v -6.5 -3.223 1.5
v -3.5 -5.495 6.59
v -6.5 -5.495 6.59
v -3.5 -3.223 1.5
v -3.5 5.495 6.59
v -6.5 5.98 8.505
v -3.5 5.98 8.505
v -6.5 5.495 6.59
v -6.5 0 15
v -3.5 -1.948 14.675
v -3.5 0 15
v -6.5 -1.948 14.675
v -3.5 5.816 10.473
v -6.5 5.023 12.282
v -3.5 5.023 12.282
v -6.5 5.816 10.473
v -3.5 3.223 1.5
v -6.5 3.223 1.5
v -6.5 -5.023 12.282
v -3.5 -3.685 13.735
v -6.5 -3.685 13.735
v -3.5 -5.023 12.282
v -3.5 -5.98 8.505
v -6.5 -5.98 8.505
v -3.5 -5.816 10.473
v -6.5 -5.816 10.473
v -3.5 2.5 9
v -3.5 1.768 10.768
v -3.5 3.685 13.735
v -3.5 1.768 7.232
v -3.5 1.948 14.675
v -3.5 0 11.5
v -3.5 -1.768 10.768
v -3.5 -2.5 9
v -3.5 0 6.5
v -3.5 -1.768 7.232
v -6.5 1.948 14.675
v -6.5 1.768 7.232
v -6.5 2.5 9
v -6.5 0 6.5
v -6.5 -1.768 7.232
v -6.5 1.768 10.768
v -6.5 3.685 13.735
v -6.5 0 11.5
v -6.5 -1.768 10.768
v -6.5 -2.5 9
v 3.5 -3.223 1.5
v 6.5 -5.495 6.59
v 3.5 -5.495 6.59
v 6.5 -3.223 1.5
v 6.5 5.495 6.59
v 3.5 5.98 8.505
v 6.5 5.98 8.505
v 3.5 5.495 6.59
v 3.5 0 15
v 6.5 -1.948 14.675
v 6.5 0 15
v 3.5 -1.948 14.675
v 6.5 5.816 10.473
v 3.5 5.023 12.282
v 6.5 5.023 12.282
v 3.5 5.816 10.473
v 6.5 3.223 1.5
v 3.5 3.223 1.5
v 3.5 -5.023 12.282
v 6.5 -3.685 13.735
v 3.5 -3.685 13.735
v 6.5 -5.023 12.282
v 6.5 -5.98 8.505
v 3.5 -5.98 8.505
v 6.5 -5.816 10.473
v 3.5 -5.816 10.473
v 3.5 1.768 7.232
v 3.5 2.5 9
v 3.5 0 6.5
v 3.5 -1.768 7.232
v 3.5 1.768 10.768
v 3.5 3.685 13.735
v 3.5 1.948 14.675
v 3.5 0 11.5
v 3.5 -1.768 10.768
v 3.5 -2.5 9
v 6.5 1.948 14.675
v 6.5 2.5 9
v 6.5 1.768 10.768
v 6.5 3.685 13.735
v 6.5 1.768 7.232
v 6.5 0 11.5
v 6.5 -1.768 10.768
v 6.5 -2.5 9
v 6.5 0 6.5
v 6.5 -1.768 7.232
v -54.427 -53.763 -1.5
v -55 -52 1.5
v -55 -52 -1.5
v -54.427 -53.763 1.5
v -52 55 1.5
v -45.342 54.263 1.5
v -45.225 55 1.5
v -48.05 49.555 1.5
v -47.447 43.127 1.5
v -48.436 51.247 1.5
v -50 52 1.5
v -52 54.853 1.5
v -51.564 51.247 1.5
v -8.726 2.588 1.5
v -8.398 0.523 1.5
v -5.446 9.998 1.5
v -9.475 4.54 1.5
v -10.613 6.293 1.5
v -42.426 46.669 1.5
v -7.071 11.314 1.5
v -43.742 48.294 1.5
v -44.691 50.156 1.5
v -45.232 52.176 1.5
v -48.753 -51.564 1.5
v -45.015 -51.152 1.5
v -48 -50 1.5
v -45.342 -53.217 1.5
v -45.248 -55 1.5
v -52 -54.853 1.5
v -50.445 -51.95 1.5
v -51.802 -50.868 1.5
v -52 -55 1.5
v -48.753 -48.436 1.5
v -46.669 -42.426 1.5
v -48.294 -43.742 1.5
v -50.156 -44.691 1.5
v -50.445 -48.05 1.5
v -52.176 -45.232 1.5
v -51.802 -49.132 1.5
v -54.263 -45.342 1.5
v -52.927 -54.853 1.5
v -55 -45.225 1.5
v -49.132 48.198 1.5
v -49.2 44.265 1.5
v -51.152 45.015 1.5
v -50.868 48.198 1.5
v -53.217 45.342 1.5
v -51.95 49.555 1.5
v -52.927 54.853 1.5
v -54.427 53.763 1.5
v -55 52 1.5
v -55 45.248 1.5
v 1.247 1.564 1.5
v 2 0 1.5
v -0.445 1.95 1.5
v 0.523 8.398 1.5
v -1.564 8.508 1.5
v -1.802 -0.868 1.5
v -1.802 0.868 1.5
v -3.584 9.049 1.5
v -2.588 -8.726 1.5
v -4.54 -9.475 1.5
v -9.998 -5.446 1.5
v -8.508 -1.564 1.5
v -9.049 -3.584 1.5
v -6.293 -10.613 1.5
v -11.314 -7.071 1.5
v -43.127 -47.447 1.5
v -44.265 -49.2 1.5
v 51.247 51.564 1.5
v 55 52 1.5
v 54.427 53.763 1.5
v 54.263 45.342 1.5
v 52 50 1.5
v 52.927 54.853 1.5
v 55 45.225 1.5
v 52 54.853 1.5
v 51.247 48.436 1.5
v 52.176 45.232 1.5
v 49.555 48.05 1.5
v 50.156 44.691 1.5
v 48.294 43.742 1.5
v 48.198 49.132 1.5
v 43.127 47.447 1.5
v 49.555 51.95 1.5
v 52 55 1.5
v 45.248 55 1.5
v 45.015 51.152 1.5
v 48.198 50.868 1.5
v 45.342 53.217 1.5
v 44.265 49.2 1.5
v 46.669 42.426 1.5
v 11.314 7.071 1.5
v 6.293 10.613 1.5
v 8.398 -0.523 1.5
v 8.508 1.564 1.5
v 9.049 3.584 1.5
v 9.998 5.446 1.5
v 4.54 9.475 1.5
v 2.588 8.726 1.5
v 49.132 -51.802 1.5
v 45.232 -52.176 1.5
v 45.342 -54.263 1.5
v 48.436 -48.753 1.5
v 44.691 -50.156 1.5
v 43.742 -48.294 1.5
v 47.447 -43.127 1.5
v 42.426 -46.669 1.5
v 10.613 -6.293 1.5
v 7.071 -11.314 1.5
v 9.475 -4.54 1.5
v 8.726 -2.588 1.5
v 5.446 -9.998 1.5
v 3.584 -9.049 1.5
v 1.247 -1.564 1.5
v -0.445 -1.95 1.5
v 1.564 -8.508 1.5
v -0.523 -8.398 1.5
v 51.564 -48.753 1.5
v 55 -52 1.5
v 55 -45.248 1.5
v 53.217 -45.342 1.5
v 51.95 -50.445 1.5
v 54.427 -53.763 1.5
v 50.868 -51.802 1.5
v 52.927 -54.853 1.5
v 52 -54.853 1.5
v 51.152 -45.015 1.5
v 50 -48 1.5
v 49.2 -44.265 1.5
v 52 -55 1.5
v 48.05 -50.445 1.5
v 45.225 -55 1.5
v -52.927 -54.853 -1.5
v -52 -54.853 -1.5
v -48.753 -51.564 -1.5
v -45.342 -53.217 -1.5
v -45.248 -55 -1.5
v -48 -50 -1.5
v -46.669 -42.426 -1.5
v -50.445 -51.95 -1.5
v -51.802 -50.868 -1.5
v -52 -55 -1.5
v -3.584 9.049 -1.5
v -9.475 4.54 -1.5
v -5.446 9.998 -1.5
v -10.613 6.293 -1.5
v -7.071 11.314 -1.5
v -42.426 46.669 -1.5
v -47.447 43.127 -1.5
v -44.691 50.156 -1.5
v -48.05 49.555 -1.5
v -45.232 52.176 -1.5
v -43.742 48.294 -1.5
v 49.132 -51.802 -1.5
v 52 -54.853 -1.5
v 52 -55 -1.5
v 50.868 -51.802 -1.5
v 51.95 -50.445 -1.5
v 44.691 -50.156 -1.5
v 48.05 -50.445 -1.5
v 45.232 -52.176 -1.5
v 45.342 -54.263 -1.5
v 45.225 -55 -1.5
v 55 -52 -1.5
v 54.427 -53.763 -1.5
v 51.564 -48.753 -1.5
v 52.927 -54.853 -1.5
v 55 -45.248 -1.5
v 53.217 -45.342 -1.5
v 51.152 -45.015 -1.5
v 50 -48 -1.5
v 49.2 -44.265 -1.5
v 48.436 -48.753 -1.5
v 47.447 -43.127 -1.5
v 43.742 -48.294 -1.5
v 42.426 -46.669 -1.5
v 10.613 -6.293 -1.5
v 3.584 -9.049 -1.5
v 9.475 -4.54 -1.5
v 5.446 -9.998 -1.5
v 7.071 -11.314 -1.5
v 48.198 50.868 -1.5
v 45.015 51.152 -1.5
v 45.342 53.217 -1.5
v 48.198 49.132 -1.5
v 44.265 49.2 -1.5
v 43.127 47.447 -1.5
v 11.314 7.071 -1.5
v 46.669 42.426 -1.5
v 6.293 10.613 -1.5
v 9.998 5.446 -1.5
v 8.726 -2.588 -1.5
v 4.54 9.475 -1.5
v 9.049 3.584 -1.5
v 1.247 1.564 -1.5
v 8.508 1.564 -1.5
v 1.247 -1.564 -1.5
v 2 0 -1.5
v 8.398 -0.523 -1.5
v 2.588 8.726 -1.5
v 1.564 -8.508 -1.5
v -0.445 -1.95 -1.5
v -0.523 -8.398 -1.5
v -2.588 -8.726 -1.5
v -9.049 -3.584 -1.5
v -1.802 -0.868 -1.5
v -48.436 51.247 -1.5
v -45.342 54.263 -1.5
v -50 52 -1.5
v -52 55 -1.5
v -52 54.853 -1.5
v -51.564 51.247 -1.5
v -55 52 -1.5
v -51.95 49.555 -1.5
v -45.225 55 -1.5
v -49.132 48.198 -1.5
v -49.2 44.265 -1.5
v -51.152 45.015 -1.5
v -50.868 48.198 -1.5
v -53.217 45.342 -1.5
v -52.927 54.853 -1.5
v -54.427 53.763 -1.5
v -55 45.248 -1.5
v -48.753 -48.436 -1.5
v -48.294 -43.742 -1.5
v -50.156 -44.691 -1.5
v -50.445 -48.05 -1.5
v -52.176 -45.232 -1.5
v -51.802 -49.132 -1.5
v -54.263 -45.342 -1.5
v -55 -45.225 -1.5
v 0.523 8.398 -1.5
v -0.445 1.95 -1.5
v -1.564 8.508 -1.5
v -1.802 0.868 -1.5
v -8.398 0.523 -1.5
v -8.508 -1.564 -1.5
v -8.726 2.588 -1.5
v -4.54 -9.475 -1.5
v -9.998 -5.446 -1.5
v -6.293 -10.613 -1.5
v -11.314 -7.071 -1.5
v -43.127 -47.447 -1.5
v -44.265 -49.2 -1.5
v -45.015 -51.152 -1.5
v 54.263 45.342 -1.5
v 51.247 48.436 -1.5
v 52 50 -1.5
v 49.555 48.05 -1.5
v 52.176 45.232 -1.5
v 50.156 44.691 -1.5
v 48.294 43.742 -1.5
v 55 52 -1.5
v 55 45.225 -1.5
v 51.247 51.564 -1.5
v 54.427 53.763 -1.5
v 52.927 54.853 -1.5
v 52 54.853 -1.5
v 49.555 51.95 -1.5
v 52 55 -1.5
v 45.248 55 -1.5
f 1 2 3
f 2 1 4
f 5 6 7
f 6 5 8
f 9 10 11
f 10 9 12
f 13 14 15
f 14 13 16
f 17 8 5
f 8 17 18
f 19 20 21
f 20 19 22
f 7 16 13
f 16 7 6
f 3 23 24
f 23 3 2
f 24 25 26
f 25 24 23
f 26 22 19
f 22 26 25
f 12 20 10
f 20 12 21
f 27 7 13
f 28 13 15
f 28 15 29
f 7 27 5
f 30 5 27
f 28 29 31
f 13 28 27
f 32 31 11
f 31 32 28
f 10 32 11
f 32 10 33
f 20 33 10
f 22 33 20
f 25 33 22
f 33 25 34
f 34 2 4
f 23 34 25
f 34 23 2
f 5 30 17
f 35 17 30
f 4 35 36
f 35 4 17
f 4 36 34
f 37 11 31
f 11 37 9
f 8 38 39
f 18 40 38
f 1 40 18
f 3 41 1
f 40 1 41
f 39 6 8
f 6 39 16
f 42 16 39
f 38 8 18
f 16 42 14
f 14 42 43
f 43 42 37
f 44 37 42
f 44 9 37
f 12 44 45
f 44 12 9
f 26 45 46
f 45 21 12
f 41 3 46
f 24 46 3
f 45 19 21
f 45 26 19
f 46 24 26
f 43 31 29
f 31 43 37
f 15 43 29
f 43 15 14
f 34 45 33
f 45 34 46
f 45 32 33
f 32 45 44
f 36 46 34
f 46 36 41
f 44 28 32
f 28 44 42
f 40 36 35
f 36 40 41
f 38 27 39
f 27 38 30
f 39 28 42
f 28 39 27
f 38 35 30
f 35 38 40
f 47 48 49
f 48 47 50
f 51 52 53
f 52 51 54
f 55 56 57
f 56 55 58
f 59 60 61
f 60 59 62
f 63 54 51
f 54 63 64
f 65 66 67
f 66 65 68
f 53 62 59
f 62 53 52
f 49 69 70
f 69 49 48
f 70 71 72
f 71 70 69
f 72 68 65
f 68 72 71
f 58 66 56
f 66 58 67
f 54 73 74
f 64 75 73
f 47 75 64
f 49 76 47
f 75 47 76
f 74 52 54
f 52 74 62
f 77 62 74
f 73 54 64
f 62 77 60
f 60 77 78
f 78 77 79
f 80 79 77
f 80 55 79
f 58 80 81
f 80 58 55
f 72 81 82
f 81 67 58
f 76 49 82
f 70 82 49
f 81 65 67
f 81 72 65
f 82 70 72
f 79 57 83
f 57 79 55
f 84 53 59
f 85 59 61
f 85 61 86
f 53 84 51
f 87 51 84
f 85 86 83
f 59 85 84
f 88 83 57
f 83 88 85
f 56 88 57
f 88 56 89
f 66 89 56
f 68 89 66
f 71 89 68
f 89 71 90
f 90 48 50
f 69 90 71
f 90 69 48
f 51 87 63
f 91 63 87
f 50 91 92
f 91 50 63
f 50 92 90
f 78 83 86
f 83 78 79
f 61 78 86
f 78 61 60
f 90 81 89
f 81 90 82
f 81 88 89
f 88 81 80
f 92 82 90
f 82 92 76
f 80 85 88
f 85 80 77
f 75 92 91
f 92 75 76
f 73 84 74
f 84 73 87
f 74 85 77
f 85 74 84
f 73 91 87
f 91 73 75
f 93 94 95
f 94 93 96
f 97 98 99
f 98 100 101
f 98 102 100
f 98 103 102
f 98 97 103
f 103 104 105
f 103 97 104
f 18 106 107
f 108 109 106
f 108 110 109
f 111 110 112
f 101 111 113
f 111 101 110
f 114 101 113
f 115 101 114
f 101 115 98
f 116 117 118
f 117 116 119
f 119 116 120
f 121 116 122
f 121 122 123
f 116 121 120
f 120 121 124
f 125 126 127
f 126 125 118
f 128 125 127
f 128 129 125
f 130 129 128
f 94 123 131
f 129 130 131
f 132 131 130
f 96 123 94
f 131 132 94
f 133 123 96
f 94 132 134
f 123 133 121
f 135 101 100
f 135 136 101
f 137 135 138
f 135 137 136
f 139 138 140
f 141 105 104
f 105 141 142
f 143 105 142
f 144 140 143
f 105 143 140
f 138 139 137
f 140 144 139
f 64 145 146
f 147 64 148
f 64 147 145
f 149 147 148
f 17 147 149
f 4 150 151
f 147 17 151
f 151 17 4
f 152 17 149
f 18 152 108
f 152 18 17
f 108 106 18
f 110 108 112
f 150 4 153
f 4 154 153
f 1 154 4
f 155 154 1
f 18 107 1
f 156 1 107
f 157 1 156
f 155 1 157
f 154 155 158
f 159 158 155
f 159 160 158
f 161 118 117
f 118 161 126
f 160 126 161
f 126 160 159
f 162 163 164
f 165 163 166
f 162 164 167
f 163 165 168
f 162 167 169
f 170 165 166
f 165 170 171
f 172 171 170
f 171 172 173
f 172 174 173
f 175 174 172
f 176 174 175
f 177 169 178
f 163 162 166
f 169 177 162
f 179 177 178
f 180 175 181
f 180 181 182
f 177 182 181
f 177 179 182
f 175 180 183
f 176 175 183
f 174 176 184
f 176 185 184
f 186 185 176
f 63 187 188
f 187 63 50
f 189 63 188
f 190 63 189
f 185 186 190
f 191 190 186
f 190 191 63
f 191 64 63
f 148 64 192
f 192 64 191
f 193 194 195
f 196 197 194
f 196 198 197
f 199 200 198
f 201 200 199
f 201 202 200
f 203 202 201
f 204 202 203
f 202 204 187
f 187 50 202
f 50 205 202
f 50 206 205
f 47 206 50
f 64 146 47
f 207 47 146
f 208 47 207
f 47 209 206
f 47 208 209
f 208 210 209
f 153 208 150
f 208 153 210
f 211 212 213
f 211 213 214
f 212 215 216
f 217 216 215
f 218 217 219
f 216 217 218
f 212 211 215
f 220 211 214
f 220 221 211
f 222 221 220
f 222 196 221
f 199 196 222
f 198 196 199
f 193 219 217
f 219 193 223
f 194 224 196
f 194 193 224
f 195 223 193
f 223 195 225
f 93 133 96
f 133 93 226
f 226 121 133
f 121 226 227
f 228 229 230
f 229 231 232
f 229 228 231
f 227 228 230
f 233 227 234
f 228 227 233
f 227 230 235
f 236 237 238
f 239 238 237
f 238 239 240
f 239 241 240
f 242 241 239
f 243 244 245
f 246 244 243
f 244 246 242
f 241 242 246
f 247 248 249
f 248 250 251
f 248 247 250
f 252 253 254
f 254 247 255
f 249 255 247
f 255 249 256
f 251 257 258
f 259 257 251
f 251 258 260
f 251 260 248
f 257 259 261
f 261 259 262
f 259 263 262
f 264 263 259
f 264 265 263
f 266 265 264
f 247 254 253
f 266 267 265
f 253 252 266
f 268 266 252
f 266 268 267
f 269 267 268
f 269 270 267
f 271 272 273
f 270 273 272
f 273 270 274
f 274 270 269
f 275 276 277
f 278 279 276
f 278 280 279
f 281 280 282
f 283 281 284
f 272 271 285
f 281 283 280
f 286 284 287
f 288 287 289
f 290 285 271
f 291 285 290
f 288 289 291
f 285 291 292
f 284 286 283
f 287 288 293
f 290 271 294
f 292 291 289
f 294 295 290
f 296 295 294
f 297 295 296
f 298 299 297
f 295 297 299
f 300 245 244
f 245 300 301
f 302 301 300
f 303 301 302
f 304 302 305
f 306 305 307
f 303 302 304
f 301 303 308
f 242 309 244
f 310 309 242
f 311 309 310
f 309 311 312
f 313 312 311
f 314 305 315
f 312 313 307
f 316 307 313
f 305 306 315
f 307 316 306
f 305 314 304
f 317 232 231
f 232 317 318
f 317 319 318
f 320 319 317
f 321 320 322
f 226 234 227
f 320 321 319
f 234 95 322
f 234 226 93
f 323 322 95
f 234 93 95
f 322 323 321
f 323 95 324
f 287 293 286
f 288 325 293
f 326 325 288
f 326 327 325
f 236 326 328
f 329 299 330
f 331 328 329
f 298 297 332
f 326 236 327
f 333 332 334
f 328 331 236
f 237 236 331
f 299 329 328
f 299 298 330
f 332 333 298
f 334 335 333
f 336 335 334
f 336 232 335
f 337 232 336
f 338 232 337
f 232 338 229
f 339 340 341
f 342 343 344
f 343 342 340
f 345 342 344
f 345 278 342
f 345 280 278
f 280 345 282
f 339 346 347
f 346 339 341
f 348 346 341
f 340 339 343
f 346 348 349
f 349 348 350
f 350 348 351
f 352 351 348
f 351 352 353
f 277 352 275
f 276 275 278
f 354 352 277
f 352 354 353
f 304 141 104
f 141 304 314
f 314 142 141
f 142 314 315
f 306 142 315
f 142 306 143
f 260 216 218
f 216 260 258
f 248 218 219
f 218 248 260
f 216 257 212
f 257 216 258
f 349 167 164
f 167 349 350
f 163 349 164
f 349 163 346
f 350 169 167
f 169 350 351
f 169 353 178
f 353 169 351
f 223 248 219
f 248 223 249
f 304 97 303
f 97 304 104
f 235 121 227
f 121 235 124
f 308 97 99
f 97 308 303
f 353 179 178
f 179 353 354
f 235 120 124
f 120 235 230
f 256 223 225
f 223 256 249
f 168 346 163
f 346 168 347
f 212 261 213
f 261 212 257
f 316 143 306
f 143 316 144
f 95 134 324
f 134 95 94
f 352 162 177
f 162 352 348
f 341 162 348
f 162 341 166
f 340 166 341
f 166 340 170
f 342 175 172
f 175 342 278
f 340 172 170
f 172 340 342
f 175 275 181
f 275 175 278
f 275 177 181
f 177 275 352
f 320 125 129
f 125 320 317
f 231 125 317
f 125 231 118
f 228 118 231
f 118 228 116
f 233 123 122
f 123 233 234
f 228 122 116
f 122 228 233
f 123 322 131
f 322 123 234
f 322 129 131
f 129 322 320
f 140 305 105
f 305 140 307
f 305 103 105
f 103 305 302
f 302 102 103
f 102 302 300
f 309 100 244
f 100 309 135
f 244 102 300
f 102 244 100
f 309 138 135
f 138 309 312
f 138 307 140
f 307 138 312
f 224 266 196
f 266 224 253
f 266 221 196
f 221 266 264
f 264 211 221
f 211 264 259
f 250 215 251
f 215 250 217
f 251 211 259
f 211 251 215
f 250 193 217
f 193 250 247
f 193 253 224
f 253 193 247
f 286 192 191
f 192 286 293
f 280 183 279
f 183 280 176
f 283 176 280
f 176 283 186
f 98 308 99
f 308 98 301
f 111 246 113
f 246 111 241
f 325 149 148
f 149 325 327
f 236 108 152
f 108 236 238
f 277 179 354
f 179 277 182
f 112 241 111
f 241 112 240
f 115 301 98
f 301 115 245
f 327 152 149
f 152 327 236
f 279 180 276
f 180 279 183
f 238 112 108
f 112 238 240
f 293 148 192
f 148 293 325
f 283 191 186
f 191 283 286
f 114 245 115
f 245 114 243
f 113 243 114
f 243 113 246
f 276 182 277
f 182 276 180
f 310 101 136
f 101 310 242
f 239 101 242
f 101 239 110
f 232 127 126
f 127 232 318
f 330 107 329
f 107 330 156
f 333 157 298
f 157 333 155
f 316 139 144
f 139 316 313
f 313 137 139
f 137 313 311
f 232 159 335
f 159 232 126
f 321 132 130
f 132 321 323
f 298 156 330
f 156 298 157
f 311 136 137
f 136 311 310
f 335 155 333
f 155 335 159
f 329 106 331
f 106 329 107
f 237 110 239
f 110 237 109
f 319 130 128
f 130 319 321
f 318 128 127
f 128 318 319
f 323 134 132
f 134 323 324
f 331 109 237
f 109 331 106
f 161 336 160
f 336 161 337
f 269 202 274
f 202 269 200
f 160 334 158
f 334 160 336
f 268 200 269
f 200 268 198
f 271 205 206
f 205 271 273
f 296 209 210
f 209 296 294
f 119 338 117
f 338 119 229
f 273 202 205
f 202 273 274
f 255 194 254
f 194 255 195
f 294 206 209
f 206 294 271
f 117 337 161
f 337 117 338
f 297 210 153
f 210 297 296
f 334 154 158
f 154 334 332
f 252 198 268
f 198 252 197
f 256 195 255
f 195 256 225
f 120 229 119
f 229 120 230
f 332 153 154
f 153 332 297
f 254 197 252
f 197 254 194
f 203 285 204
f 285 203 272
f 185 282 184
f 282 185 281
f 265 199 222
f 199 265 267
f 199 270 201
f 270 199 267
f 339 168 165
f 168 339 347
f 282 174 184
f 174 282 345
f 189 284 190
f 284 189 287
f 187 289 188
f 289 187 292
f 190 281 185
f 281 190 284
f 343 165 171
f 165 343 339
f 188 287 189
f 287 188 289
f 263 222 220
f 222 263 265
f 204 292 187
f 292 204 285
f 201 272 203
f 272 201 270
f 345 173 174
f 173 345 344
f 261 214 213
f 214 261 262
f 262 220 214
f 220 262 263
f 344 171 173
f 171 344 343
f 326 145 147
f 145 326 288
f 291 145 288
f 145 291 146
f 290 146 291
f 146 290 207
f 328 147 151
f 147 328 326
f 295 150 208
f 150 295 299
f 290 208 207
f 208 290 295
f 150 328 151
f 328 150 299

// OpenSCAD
use <MCAD/boxes.scad>


holeRadius=2.5;
hookDistance = 5;
hookThickness = 3;


/*
		Building the vesa mount stand 
*/
vesaMountStand();

module vesaMountStand(vesaStandWanted=true){
	
	vesaDimensionXY =100;
	screwRadius=2;

	// the hook
	module mkHook(){
				
		translate([-hookDistance,0,3])rotate([90,-90,90])difference(){
		hull(){
					
					roundedBox(size=[6,6,hookThickness],radius=1, sidesonly=true);
					translate([6,0,0]) cylinder(r=6,h=hookThickness,center=true);
					
				}
		translate([6,0,0])cylinder(r=holeRadius,h=hookThickness+1,center=true);
		}
	
	}

	// cutting the sides off
	module triangle(side1, side2, corner_radius, triangle_hight){
	
		translate([corner_radius+3, corner_radius+3,0])
		hull(){
		
			cylinder(r=corner_radius, h=triangle_hight,center=true);
			translate([side1-(2*corner_radius), 0,0]) cylinder(r=corner_radius, h=triangle_hight, center=true);
			translate([0,side2-(2*corner_radius)],0) cylinder(r=corner_radius, h=triangle_hight, center=true);
			}
	}

	// holes
	module mkHole() {
		
		for(i=[45:90:359]){
		
			translate([((vesaDimensionXY/2)/sin(i))*cos(i),((vesaDimensionXY/2)/cos(i))*sin(i),0]) cylinder(r=screwRadius,h=5,center=true);
		}
	}

	if(vesaStandWanted){
	
		mkHook() ;
		mirror([4,0,0]) mkHook();
		difference(){

			roundedBox(size = [110,110,3],radius = 3 ,sidesonly=true);
	
		// middle hole
			cylinder(r=screwRadius, h=5, center=true);
		// sides holes
		mkHole();
			rotate([0,0,90])mkHole();
		
			for(i=[45:90:359]){
				rotate([0,0,i])triangle(70,70,10,7);  
				}
			}
	}
}
